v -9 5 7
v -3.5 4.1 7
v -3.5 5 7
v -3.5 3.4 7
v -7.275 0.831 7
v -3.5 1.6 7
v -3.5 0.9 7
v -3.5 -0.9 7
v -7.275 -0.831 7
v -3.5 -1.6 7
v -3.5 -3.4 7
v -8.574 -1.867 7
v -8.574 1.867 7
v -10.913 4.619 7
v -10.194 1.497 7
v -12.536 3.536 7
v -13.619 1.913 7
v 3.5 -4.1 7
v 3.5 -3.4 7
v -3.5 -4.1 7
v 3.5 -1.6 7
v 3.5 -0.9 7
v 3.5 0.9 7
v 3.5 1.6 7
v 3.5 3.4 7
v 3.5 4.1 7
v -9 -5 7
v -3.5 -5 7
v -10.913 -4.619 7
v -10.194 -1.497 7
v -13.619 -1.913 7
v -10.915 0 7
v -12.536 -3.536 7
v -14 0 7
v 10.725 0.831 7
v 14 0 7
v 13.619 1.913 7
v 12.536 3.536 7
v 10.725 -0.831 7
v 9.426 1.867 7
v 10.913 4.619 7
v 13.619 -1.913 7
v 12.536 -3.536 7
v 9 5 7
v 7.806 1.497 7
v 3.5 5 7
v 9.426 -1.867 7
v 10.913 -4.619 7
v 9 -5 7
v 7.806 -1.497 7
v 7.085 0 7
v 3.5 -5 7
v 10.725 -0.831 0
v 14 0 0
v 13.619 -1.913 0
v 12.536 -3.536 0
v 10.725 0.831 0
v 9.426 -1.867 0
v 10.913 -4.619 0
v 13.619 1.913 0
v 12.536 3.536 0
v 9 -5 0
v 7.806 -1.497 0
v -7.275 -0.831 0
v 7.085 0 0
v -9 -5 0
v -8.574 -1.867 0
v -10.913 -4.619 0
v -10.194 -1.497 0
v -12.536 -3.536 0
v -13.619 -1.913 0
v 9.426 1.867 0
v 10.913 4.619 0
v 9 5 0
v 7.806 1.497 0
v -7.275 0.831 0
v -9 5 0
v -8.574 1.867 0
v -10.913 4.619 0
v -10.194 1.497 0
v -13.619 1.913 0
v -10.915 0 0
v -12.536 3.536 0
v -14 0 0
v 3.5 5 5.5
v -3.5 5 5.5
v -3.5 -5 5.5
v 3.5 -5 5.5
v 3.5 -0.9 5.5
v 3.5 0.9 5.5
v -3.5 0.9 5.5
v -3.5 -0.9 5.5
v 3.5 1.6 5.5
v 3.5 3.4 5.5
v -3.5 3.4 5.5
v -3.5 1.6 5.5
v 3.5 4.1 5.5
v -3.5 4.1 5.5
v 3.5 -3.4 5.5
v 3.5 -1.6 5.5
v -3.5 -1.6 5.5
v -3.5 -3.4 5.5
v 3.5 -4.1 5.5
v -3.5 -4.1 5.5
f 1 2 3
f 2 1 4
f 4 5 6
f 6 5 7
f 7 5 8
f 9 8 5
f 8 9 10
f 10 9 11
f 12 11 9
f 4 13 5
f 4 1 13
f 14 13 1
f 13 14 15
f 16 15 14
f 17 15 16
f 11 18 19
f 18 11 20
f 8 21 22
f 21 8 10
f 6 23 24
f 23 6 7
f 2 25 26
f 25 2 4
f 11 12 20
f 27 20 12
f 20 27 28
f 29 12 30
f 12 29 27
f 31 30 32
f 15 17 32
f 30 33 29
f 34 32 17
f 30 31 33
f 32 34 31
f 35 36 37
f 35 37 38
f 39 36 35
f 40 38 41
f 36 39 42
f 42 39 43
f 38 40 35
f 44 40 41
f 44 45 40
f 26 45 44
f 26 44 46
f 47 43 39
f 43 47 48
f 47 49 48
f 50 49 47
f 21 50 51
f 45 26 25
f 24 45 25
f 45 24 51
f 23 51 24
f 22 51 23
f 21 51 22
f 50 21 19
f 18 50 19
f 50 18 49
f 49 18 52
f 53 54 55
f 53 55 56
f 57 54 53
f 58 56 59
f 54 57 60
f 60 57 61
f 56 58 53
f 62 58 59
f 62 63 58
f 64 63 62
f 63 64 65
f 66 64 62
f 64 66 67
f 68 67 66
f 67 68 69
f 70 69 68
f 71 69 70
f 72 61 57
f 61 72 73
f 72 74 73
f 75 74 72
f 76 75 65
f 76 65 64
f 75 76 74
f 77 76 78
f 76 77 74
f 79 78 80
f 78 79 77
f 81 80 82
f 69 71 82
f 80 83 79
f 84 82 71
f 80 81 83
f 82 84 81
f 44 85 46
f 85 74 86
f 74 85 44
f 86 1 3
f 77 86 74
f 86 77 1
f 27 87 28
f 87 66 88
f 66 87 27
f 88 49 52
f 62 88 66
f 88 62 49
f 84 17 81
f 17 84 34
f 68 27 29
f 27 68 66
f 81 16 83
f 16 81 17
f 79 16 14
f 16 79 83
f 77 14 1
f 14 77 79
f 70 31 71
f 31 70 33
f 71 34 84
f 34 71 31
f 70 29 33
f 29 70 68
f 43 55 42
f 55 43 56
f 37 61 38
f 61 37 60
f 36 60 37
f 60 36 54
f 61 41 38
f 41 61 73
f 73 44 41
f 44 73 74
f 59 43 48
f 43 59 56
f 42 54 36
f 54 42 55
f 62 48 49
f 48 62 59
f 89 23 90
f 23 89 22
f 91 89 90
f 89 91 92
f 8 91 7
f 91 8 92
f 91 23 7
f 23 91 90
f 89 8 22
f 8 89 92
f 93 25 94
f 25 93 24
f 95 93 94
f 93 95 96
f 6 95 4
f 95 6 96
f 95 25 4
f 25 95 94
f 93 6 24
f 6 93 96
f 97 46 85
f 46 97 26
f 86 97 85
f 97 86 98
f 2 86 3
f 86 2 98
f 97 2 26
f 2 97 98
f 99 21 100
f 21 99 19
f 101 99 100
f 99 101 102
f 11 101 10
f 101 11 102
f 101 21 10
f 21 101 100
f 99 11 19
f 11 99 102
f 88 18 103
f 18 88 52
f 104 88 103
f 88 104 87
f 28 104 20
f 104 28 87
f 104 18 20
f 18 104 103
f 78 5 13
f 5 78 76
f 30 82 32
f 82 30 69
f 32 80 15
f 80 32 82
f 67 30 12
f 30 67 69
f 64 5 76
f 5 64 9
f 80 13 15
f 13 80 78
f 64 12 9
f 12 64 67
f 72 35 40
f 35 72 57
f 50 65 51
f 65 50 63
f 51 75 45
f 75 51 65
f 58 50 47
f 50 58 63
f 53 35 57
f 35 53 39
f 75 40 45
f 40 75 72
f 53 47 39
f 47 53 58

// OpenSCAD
// file: functions.scad
// PRUSA Mendel  
// Functions used in many files
// GNU GPL v3
// Josef Průša
// josefprusa@me.com
// prusadjs.cz
// http://www.reprap.org/wiki/Prusa_Mendel
// http://github.com/prusajr/PrusaMendel


module nut(d,h,horizontal=true){
cornerdiameter =  (d / 2) / cos (180 / 6);
cylinder(h = h, r = cornerdiameter, $fn = 6);
if(horizontal){
for(i = [1:6]){
	rotate([0,0,60*i]) translate([-cornerdiameter-0.2,0,0]) rotate([0,0,-45]) cube(size = [2,2,h]);
}}
}

// Based on nophead research
module polyhole(d,h) {
    n = max(round(2 * d),3);
    rotate([0,0,180])
        cylinder(h = h, r = (d / 2) / cos (180 / n), $fn = n);
}




module roundcorner(diameter){
	difference(){
		cube(size = [diameter,diameter,99], center = false);
		translate(v = [diameter, diameter, 0]) cylinder(h = 100, r=diameter, center=true);
	}
}
// file: metric.scad
// PRUSA Mendel  
// Default metric sizes
// GNU GPL v3
// Josef Průša
// josefprusa@me.com
// prusadjs.cz
// http://www.reprap.org/wiki/Prusa_Mendel
// http://github.com/prusajr/PrusaMendel

// DONT CHANGE THIS FILE! ALTER VALUES IN CONFIGURATION.SCAD INSTEAD

// RODS

threaded_rod_diameter = 8.7;
threaded_rod_diameter_horizontal = 8.7;
smooth_bar_diameter = 8;
smooth_bar_diameter_horizontal = 8.5;

// Nuts and bolts

m8_diameter = 9;
m8_nut_diameter = 14.1;

m4_diameter = 4.5;
m4_nut_diameter = 9;

m3_diameter = 3.6;
m3_nut_diameter = 5.3;
m3_nut_diameter_horizontal = 6.1;

// Bushing holder

bushing_core_diameter = smooth_bar_diameter;
bushing_material_thickness = 1;

// Motors

motor_shaft = 5.5;
// file: configuration.scad
// PRUSA Mendel  
// Configuration file
// GNU GPL v3
// Josef Průša
// josefprusa@me.com
// prusadjs.cz
// http://www.reprap.org/wiki/Prusa_Mendel
// http://github.com/prusajr/PrusaMendel

// PLEASE SELECT ONE OF THE CONFIGURATIONS BELOW
// BY UN-COMMENTING IT

// Uncomment for metric settings
// METRIC METRIC METRIC METRIC METRIC METRIC METRIC METRIC 

include <metric.scad>;

// CUSTOM CUSTOM CUSTOM CUSTOM CUSTOM CUSTOM CUSTOM CUSTOM CUSTOM

thin_wall = 3;


// Linear bearing version
linear = true;
// set false for LM-8UU, true for LM-E-8UU (ignore if linear is set to false)
lme8uu = false;



// CHANGE ONLY THE STUFF YOU KNOW
// IT WILL REPLACE DEFAULT SETTING

// RODS
threaded_rod_diameter = 9.1;
threaded_rod_diameter_horizontal = 0;
// smooth_bar_diameter = 0;
// smooth_bar_diameter_horizontal = 0;

// Nuts and bolts

m8_diameter = 8.125;
m8_nut_diameter = 13;

m4_diameter = 4.5;
m4_nut_diameter = 8.1;

m3_diameter = 3.45;
m3_nut_diameter = 6.34;

motor_shaft = 5.65;

// Bushing holder

// bushing_core_diameter = smooth_bar_diameter;
// bushing_material_thickness = 0;


///counted stuff
m3_nut_diameter_bigger = ((m3_nut_diameter  / 2) / cos (180 / 6))*2;
//m3_nut_diameter = m3_nut_diameter_bigger;
// functions 
include <functions.scad>
// main file
// PRUSA Mendel  
// Belt clamp
// GNU GPL v3
// Josef Průša
// josefprusa@me.com
// prusadjs.cz
// http://www.reprap.org/wiki/Prusa_Mendel
// http://github.com/prusajr/PrusaMendel

include <configuration.scad>

/**
 * @id belt-clamp
 * @name Belt clamp
 * @category Printed
 */ 

module beltclamp(){
difference(){
	union(0){
translate(v = [0,0,3.5]) cube([18,10,7], center=true);
		translate(v = [-9, 0, 0]) cylinder(r=5,h=7);
		translate(v = [9, 0, 0]) cylinder(r=5,h=7);
}
translate(v = [-9, 0, -1])polyhole(m3_diameter, 12);
translate(v = [9, 0, -1]) polyhole(m3_diameter, 12);
translate(v = [0,0,6.5]){
translate(v = [0,0,5])cube(size = [7, 1.8, 12], center = true);
translate(v = [0,2.5,5])cube(size = [7, 1.8, 12], center = true);
translate(v = [0,5,5])cube(size = [7, 1.8, 12], center = true);
translate(v = [0,-2.5,5])cube(size = [7, 1.8, 12], center = true);
translate(v = [0,-5,5])cube(size = [7, 1.8, 12], center = true);
}
}
}
beltclamp();
